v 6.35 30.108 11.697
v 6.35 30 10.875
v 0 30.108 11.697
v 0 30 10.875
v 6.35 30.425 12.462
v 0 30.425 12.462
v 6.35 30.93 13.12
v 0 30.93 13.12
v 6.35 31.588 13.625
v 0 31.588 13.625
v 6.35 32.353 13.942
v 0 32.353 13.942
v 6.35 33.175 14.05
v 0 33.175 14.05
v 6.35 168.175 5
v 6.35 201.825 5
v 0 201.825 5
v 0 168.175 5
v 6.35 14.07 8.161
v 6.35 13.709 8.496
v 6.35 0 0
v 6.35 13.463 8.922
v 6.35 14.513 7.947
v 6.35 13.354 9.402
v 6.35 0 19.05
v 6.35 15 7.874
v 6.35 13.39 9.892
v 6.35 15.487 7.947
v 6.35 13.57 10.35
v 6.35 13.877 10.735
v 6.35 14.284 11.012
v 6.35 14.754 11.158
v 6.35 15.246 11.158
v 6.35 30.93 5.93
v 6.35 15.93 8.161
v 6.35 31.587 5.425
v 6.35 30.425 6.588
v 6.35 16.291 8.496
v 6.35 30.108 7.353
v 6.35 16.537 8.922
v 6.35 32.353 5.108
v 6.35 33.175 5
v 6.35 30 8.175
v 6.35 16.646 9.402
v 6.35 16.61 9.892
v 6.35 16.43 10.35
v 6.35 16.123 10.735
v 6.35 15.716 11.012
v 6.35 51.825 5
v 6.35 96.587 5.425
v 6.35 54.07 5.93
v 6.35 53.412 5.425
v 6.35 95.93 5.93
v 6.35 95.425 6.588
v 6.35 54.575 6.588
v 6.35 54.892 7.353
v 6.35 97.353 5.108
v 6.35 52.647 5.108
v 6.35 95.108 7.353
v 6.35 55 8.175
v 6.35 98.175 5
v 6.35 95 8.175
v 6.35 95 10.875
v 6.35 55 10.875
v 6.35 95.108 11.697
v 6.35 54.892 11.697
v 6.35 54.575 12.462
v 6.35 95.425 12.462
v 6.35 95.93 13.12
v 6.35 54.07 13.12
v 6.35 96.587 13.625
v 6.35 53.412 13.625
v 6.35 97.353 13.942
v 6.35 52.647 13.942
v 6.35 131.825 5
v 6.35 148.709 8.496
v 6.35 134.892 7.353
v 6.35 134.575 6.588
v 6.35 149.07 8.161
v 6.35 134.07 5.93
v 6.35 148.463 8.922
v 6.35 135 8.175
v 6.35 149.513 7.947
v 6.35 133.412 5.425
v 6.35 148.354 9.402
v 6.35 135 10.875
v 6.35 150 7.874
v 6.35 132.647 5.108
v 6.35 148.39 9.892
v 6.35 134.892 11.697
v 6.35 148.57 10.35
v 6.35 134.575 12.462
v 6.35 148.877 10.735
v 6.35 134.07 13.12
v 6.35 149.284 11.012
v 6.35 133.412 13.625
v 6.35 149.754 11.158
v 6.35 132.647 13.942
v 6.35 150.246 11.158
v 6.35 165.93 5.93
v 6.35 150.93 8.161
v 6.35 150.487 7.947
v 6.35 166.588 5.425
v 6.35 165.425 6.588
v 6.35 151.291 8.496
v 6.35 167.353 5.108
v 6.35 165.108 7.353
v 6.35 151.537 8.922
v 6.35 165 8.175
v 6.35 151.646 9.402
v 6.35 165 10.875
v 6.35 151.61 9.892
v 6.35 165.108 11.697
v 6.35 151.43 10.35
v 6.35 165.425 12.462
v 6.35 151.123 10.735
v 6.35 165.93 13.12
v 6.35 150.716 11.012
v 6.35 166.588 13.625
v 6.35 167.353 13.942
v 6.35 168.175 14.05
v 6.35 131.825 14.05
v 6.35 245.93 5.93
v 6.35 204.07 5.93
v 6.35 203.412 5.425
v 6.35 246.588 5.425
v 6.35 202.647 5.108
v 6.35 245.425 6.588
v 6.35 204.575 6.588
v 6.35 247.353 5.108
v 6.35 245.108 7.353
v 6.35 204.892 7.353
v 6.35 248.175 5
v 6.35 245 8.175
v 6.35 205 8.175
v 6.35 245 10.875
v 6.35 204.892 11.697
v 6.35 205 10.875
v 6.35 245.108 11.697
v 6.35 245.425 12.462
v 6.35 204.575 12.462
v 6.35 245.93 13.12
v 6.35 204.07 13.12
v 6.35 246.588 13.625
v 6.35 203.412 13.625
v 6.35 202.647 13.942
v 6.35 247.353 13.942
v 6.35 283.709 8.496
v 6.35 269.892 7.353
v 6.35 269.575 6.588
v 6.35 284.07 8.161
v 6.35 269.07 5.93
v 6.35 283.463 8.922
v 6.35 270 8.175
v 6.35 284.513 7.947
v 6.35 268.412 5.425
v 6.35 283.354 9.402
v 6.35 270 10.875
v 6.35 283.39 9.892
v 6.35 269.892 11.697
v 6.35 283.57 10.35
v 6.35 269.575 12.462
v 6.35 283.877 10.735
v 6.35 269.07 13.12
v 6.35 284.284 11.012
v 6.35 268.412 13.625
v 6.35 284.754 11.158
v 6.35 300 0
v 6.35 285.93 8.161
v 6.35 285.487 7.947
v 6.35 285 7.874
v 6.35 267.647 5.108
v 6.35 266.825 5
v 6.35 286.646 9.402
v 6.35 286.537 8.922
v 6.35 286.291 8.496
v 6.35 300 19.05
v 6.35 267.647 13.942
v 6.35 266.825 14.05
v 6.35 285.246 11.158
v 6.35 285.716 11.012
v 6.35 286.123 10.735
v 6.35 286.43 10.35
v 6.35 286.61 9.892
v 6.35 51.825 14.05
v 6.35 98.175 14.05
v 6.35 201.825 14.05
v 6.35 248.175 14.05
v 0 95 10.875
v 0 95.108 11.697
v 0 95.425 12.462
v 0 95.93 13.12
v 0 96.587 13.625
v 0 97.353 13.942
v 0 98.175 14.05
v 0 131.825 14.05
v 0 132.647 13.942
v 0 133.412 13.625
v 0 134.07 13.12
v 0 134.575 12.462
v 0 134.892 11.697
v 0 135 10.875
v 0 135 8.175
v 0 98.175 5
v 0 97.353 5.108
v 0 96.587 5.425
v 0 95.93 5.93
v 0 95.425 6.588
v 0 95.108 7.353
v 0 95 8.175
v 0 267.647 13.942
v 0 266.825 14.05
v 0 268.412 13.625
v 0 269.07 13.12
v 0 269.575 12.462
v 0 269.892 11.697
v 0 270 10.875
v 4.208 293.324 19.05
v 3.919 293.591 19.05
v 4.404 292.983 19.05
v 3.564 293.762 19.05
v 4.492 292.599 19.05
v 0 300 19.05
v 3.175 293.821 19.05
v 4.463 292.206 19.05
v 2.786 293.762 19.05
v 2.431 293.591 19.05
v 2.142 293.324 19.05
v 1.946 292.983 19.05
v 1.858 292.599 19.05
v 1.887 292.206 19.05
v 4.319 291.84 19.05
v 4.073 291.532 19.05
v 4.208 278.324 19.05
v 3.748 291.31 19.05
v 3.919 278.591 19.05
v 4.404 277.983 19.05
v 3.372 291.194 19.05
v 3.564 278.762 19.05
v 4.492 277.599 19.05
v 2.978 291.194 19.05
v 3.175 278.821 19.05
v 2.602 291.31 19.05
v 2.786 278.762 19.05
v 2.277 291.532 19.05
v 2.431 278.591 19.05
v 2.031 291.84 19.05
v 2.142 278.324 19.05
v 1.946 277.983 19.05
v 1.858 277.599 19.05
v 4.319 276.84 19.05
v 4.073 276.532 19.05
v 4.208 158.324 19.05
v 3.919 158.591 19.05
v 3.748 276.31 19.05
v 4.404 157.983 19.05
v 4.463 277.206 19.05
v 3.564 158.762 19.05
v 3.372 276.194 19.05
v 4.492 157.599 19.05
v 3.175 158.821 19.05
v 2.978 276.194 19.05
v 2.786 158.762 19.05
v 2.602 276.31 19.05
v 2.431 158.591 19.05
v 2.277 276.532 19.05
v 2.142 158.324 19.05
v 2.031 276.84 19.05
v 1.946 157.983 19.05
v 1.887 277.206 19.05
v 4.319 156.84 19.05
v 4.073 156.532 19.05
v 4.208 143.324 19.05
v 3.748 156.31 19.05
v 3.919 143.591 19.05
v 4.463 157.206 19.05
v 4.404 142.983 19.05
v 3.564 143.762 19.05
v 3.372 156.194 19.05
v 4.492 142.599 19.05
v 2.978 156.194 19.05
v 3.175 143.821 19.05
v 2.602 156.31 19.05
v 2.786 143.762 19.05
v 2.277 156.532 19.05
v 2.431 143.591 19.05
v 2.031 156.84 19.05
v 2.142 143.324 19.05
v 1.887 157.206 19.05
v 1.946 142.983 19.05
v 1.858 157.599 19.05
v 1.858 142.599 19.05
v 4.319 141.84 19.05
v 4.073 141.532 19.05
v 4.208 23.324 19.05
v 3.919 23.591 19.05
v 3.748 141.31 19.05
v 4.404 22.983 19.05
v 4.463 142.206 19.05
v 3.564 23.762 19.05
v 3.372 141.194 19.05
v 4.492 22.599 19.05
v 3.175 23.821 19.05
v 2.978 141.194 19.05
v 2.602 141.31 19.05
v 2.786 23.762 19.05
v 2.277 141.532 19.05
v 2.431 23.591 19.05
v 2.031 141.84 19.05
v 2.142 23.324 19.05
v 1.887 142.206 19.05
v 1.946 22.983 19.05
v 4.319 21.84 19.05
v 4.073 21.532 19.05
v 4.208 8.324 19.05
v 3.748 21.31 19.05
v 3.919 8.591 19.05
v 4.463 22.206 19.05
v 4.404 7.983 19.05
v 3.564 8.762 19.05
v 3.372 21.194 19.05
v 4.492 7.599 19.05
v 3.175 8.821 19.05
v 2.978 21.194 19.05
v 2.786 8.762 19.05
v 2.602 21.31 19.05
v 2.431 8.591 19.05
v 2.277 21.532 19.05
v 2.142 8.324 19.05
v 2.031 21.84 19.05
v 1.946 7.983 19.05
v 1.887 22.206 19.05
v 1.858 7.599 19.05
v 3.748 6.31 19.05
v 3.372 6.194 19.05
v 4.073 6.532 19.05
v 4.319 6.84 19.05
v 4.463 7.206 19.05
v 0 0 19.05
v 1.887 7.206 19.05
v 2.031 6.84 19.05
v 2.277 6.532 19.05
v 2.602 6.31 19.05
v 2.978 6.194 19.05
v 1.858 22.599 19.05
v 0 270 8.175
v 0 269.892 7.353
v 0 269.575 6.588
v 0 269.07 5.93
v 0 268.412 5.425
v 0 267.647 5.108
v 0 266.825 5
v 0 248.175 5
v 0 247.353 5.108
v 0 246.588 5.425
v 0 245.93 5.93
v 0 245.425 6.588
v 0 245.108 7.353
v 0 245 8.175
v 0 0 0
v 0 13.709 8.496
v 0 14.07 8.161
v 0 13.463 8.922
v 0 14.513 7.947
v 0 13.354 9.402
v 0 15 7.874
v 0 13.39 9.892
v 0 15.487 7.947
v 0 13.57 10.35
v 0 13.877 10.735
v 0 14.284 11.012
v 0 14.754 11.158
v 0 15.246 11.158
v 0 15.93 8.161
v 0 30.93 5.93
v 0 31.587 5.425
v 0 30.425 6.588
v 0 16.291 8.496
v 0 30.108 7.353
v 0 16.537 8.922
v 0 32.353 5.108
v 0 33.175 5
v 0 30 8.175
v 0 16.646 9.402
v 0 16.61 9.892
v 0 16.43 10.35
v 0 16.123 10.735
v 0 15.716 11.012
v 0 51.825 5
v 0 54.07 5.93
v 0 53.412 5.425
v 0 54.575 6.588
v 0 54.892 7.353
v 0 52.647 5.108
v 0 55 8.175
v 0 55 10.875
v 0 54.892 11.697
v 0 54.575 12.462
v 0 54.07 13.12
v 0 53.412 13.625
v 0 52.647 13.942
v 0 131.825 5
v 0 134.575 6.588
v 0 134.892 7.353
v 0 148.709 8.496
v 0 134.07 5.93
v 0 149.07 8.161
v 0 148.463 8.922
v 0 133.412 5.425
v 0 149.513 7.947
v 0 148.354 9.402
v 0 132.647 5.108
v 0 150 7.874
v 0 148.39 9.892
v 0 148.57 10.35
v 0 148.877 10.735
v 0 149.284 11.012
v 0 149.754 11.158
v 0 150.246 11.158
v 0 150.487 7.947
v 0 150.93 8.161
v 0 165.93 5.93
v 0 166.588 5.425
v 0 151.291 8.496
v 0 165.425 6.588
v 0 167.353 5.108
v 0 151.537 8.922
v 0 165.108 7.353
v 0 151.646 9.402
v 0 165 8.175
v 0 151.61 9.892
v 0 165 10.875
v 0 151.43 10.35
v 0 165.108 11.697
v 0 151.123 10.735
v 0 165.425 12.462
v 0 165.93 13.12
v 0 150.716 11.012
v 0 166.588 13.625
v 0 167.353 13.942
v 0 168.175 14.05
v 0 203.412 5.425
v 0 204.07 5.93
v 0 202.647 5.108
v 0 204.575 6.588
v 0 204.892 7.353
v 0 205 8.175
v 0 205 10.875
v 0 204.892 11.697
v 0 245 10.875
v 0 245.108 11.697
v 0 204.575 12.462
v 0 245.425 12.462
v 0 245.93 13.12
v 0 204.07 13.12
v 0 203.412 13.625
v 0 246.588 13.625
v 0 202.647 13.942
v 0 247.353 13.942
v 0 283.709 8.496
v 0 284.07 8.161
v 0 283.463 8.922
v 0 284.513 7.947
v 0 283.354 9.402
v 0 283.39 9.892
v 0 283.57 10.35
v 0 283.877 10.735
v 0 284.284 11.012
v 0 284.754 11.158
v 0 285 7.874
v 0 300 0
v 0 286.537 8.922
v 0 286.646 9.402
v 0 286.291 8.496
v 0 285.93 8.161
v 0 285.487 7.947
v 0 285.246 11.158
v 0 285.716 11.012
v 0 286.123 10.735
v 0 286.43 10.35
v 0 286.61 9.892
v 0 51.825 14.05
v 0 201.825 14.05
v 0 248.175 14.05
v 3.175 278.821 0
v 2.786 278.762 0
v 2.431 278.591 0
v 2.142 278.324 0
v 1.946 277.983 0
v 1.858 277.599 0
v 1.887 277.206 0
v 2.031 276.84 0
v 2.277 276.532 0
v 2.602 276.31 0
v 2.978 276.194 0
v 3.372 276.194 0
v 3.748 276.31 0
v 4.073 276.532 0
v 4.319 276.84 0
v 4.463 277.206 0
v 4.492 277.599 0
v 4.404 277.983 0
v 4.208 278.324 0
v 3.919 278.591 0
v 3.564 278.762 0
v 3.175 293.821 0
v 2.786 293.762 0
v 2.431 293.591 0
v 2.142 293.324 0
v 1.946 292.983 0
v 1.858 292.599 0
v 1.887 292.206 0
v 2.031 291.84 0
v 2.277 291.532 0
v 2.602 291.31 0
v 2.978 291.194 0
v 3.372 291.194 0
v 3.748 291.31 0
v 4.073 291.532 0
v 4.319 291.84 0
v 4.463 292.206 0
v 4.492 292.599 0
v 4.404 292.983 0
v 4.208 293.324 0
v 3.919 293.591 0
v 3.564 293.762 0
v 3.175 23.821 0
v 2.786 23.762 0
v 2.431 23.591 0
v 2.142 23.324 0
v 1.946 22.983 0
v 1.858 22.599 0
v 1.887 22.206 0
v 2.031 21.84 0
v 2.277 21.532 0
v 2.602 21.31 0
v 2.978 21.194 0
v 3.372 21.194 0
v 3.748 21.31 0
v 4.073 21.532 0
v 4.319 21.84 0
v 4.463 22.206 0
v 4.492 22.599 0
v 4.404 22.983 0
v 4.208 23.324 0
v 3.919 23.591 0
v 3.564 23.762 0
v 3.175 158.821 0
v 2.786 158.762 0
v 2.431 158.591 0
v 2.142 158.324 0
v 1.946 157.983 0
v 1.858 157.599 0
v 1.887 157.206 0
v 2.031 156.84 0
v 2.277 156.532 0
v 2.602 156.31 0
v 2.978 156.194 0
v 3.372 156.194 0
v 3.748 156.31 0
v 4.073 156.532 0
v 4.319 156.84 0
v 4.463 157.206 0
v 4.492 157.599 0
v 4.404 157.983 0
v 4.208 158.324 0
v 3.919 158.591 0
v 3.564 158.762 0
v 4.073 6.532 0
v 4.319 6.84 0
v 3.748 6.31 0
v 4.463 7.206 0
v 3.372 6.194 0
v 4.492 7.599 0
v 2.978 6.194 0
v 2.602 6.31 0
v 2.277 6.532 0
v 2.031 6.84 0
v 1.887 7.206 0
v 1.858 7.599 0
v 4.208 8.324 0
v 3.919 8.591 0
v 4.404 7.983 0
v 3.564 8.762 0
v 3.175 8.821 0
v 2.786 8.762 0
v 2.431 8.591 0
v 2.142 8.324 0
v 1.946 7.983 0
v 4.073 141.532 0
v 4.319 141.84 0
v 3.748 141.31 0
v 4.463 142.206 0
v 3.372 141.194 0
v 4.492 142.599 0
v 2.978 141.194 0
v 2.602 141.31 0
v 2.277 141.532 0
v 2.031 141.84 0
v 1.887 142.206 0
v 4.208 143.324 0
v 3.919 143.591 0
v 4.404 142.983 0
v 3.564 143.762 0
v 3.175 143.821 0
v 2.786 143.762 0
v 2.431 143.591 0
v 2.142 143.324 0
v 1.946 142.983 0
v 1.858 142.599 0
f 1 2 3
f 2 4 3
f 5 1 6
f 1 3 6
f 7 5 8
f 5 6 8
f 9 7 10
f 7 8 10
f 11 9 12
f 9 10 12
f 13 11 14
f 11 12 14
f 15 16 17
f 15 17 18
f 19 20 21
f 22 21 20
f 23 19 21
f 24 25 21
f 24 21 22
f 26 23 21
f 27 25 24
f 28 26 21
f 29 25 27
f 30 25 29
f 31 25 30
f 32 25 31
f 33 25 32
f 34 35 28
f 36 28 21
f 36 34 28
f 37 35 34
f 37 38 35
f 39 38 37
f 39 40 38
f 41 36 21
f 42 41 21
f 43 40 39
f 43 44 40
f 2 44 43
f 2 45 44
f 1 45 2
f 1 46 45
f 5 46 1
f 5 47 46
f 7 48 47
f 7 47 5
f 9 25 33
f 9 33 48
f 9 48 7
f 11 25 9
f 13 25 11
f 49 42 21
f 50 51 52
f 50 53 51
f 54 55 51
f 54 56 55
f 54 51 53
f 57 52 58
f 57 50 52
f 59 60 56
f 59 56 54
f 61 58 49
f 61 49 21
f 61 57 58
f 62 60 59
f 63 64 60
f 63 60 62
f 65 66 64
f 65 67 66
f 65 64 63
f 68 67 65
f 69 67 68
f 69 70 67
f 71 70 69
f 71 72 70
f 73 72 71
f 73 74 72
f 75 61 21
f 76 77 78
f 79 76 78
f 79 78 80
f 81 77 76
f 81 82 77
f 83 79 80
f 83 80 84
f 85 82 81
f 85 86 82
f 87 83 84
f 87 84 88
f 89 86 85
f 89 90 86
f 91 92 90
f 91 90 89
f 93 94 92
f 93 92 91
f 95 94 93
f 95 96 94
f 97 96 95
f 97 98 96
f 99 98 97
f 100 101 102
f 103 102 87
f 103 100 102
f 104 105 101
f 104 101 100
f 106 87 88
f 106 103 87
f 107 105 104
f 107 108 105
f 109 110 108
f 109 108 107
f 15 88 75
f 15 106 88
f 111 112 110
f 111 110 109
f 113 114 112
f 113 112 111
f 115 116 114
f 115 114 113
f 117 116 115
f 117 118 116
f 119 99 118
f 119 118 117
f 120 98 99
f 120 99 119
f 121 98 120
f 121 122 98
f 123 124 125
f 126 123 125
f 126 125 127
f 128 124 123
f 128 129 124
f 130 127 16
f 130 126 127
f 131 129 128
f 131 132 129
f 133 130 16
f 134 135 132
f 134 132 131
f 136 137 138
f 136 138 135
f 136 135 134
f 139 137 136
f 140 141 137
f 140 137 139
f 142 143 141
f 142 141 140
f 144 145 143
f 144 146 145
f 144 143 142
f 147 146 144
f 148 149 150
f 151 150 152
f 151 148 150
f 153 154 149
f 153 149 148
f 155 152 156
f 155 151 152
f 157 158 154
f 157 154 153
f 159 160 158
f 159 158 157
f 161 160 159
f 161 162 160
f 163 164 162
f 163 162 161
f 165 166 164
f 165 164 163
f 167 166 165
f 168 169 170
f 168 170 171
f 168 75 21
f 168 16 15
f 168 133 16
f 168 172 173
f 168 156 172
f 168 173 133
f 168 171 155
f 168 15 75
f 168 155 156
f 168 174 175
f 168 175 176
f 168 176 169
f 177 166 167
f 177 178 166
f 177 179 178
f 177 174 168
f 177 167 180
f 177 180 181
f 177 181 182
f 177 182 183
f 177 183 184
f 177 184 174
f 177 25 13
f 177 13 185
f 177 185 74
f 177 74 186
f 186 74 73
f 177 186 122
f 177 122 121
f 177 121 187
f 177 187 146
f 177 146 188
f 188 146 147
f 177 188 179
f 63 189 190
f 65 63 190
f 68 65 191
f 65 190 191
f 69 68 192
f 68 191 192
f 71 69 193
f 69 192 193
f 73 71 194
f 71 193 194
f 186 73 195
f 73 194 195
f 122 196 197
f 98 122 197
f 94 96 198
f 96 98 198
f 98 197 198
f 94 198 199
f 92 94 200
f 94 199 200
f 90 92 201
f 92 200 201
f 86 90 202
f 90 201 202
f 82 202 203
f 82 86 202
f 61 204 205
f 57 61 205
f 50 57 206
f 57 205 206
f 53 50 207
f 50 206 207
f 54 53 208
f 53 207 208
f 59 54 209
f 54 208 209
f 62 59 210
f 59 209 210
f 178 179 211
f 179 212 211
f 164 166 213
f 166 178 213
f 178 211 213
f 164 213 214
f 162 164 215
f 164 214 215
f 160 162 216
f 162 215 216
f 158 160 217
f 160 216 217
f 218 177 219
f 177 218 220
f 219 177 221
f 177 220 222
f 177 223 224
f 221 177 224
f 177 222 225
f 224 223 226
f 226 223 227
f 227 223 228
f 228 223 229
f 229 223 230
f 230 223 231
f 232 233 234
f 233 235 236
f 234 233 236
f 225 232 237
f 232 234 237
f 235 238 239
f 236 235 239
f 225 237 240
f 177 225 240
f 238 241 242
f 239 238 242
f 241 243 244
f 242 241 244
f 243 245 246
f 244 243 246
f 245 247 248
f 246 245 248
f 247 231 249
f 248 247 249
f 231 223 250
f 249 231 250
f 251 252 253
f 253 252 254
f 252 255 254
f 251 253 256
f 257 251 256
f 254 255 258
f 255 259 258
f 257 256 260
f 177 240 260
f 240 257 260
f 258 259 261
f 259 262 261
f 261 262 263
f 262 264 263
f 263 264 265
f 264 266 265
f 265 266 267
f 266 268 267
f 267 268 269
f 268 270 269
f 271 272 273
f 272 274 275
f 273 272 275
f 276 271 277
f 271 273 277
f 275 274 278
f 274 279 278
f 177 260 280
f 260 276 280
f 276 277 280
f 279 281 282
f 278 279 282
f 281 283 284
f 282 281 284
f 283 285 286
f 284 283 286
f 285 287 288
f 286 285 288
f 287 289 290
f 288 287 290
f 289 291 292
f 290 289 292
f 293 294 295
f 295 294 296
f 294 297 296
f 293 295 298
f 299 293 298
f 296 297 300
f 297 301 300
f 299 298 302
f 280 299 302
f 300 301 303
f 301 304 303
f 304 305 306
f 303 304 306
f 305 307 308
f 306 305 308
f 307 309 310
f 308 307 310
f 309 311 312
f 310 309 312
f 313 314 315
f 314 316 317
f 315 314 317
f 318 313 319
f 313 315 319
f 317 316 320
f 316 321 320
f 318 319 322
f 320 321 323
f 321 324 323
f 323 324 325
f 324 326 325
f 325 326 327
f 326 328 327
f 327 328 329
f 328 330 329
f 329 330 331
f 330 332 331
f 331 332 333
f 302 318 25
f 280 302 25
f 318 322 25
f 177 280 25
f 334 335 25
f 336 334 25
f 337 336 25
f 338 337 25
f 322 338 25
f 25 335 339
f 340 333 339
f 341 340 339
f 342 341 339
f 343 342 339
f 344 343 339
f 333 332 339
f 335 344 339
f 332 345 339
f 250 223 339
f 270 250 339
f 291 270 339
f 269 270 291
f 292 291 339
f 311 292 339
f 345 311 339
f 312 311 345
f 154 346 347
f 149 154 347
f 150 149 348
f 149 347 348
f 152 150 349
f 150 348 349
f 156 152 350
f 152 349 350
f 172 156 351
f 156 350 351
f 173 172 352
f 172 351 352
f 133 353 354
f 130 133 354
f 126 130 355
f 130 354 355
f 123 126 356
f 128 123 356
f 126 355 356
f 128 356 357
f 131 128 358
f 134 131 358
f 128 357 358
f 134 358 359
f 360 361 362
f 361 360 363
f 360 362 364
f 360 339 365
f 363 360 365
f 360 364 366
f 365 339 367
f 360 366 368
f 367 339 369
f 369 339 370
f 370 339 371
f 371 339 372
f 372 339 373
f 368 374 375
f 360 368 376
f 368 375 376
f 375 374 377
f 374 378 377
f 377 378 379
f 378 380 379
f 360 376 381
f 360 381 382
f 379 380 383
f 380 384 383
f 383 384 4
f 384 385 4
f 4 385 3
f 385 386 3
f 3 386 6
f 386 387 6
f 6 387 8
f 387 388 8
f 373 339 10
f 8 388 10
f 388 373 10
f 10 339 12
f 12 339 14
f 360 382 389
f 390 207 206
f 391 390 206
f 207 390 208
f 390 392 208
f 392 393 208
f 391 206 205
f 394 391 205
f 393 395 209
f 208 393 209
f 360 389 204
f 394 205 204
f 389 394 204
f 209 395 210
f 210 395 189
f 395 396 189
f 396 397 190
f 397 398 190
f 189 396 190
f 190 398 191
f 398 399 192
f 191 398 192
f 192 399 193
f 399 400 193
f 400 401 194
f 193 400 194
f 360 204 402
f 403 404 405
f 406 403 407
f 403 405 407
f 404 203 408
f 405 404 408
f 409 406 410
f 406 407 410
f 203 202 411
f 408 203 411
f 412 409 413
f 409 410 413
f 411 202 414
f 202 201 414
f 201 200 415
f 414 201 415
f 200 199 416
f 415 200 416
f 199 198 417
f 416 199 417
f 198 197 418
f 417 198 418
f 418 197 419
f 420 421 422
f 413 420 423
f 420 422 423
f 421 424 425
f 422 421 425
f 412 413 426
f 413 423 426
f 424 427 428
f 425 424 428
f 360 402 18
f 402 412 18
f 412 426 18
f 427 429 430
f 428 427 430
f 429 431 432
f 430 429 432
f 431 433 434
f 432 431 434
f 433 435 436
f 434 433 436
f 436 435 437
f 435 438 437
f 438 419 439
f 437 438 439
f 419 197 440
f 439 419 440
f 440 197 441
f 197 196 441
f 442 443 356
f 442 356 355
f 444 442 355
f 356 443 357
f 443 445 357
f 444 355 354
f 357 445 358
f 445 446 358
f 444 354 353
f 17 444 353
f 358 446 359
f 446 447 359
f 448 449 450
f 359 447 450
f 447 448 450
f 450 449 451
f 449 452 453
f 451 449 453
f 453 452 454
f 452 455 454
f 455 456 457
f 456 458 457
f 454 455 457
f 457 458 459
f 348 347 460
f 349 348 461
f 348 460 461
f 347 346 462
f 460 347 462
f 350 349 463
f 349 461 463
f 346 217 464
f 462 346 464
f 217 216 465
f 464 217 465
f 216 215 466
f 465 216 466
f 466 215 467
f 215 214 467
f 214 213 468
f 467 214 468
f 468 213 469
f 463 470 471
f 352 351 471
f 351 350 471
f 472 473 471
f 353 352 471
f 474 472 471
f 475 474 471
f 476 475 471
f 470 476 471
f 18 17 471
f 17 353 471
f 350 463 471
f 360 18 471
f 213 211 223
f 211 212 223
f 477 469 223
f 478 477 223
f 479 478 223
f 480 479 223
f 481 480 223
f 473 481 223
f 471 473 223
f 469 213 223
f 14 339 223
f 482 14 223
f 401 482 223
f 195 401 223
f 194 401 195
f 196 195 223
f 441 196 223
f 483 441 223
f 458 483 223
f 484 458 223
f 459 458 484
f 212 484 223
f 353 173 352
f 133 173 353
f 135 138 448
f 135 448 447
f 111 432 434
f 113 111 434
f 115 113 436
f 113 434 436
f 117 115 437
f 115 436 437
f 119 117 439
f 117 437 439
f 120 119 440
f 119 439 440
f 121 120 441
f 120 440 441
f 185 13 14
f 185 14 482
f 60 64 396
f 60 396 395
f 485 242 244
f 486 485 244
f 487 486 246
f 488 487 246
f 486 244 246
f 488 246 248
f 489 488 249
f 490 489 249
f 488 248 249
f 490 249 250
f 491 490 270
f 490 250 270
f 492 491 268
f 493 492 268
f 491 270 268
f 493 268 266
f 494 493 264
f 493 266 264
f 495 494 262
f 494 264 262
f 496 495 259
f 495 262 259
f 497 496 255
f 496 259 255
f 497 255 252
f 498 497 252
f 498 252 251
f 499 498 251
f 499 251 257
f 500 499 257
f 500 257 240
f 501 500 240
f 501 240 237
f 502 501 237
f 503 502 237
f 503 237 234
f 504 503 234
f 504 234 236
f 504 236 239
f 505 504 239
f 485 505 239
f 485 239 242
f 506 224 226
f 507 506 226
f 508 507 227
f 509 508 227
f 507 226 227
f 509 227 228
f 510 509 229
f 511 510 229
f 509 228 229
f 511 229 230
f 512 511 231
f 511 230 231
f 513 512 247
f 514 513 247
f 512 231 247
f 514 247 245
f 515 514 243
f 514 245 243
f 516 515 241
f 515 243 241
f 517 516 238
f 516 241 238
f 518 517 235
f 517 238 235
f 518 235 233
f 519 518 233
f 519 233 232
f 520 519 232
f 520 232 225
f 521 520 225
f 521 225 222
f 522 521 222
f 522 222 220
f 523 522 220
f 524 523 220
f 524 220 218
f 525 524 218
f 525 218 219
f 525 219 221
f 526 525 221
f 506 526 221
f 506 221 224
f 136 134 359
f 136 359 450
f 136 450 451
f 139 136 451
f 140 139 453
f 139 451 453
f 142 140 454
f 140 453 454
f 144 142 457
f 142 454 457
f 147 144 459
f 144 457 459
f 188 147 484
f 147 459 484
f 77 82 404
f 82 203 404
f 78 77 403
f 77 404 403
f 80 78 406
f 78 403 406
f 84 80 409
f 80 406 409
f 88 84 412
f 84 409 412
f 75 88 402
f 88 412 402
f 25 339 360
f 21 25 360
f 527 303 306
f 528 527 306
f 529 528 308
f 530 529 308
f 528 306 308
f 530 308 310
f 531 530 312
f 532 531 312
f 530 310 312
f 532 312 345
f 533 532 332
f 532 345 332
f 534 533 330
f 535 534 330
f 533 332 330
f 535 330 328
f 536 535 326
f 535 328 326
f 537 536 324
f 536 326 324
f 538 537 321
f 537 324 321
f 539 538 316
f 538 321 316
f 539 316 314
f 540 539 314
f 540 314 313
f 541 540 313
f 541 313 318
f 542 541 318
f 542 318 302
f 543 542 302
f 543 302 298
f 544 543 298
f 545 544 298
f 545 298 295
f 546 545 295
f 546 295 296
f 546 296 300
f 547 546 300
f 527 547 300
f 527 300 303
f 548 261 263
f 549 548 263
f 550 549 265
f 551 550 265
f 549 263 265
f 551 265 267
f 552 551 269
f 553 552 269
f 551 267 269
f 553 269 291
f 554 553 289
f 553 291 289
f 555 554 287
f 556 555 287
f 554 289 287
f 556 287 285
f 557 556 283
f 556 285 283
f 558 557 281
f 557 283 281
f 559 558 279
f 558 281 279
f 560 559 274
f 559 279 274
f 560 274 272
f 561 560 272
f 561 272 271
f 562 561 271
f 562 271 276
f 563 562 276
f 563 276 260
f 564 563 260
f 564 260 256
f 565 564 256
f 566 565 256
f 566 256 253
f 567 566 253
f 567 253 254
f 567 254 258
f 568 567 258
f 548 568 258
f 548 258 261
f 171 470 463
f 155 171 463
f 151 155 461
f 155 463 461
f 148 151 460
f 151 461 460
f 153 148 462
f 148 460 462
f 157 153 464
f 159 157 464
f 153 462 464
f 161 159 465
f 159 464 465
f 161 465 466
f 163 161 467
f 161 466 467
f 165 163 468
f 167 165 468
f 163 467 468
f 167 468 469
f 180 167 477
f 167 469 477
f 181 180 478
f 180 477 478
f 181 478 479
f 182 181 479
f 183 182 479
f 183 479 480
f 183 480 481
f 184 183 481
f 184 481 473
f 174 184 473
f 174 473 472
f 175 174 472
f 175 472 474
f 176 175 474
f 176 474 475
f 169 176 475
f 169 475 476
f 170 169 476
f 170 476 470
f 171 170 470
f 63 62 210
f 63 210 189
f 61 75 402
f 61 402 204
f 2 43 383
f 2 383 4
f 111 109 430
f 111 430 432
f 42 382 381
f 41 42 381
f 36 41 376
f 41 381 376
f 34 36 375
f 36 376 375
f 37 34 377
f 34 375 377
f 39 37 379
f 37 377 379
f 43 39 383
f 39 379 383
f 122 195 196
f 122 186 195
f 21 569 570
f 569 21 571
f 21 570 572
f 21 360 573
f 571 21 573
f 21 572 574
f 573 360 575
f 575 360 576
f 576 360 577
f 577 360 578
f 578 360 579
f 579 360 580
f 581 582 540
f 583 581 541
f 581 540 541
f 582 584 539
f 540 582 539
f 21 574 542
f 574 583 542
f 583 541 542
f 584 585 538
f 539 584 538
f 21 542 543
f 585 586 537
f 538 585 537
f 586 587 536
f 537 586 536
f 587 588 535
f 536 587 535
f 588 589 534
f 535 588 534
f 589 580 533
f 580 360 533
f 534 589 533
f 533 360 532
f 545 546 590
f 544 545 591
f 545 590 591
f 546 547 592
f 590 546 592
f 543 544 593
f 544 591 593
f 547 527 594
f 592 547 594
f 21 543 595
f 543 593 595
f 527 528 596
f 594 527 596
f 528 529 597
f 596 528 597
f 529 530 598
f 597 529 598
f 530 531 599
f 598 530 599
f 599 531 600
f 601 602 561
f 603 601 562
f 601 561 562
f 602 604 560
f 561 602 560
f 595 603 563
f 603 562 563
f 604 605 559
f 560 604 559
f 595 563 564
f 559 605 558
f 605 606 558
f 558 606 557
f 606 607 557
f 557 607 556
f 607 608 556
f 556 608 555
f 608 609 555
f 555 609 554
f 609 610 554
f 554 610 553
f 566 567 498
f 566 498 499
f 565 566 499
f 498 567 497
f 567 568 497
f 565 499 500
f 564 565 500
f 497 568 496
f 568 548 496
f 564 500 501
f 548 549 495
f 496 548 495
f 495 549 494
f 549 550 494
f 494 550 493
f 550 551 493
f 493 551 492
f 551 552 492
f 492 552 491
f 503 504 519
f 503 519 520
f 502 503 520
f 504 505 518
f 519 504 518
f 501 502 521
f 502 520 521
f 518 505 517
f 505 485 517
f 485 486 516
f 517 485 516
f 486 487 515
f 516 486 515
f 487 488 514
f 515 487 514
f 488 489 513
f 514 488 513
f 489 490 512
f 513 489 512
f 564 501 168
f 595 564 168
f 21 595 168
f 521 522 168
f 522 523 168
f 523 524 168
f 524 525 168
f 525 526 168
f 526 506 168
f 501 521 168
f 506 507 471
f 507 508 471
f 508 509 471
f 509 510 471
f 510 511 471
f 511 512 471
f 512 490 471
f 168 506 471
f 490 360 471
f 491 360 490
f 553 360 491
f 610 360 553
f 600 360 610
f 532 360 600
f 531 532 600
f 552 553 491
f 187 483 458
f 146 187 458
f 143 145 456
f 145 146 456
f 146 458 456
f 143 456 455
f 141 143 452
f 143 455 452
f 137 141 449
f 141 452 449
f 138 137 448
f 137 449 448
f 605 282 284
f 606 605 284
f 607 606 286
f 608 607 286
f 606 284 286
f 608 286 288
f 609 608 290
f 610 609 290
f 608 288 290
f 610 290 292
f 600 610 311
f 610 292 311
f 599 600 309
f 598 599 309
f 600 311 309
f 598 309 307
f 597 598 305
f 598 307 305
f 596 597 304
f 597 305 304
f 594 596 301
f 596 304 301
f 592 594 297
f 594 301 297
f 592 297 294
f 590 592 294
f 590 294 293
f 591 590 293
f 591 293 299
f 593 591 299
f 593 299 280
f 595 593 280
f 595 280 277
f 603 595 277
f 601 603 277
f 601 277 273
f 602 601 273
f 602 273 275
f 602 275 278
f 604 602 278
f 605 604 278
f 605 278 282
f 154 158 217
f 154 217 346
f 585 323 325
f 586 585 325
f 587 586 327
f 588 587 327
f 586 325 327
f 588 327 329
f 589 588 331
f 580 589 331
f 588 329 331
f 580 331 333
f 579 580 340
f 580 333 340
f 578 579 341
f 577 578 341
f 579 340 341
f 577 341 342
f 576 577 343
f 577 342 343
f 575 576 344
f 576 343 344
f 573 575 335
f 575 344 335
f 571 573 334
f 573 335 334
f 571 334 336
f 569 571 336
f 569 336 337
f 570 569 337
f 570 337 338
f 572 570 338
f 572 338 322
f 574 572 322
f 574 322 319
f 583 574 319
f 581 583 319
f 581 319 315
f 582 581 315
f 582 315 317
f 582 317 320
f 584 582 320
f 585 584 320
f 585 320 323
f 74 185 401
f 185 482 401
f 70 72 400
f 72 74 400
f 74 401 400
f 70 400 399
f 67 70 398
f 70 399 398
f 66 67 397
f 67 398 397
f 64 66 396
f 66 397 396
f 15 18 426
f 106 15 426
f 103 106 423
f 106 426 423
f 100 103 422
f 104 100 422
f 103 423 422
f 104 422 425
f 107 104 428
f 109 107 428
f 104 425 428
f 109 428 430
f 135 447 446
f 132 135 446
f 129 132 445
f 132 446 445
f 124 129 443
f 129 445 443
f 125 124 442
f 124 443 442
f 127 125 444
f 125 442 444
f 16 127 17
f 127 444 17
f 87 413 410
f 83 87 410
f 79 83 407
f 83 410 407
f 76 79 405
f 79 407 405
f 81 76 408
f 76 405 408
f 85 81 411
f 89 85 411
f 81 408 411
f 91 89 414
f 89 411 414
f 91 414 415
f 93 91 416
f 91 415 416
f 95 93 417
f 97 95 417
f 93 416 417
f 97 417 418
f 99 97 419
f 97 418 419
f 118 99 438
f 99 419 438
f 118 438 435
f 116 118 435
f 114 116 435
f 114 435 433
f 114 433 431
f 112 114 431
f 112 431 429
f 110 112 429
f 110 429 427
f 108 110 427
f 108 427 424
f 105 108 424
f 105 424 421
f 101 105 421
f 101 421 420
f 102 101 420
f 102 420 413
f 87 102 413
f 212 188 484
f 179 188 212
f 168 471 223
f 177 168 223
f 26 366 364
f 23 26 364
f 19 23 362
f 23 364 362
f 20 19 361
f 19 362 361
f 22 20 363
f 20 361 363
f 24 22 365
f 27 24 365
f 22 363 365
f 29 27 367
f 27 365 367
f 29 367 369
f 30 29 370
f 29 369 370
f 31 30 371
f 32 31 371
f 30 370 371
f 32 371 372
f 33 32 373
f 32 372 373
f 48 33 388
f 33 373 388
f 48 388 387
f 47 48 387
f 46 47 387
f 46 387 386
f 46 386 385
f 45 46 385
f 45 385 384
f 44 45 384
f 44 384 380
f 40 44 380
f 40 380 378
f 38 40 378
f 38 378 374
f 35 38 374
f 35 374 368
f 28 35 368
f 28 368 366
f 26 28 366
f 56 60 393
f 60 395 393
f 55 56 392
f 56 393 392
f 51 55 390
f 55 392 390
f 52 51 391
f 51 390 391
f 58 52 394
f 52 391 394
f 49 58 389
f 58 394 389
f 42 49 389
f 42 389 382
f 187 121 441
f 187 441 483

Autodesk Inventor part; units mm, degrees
ref_plane "YZ Plane" through (0, 0, 0) normal (1, 0, 0) x (0, 1, 0)
ref_plane "XZ Plane" through (0, 0, 0) normal (0, 1, 0) x (-1, 0, 0)
ref_plane "XY Plane" through (0, 0, 0) normal (0, 0, 1) x (1, 0, 0)
sketch "Sketch1" plane through (0, 0, 0) normal (1, 0, 0) x (0, 1, 0)
  line L0 (0, 0) -> (300, 0)
  line L1 (300, 0) -> (300, 19.05)
  line L2 (300, 19.05) -> (0, 19.05)
  line L3 (0, 19.05) -> (0, 0)
  dimension "d0" = 300
  dimension "d1" = 19.05
extrude "Extrusion1" add sketch "Sketch1" along normal blind 6.35
sketch "Sketch2" plane through (6.35, 0, 0) normal (1, 0, 0) x (0, 0, -1)
  line L0 (0, 300) -> (-19.05, 300) projected
  line L1 (-19.05, 300) -> (-19.05, 0) projected
  line L2 (-19.05, 0) -> (0, 0) projected
  point P0 (-9.525, 285)
  point P1 (-9.525, 150)
  point P2 (-9.525, 15)
  dimension "d4" = 15
  dimension "d5" = 19.05
  dimension "d6" = 9.525
  dimension "d7" = 15
  dimension "d8" = 9.525
  dimension "d9" = 9.525
  dimension "d10" = 150
hole "Hole1" at (6.35, 285, 9.525) at (6.35, 150, 9.525) at (6.35, 15, 9.525) direction (-1, 0, 0) diameter 3.302 end through all thread size "8-32 UNC" class "2B" standard "ANSI Unified Screw Threads"
sketch "Sketch5" plane through (6.35, 0, 0) normal (1, 0, 0) x (0, 0, -1)
  line L0 (-14.05, 270) -> (-5, 270)
  line L1 (-5, 270) -> (-5, 245)
  line L2 (-5, 245) -> (-14.05, 245)
  line L3 (-14.05, 245) -> (-14.05, 270)
  line L4 (-14.05, 205) -> (-5, 205)
  line L5 (-5, 205) -> (-5, 165)
  line L6 (-5, 165) -> (-14.05, 165)
  line L7 (-14.05, 165) -> (-14.05, 205)
  line L8 (-14.05, 135) -> (-5, 135)
  line L9 (-5, 135) -> (-5, 95)
  line L10 (-5, 95) -> (-14.05, 95)
  line L11 (-14.05, 95) -> (-14.05, 135)
  line L12 (-14.05, 55) -> (-5, 55)
  line L13 (-5, 55) -> (-5, 30)
  line L14 (-5, 30) -> (-14.05, 30)
  line L15 (-14.05, 30) -> (-14.05, 55)
  line L16 (0, 0) -> (0, 300) projected
  line L17 (-19.05, 300) -> (-19.05, 0) projected
  line L18 (0, 300) -> (-19.05, 300) projected
  line L19 (-19.05, 0) -> (0, 0) projected
  dimension "d44" = 5
  dimension "d45" = 5
  dimension "d46" = 30
  dimension "d47" = 30
  dimension "d48" = 55
  dimension "d49" = 95
  dimension "d50" = 135
  dimension "d51" = 55
  dimension "d52" = 95
  dimension "d53" = 135
extrude "Extrusion2" cut sketch "Sketch5" against normal through all contours L0 L1 L2 L3 | L4 L5 L6 L7 | L8 L9 L10 L11 | L12 L13 L14 L15
fillet "Fillet1" radius 3.175 1 edges at (3.175, 270, 5)
fillet "Fillet2" radius 3.175 1 edges at (3.175, 270, 14.05)
fillet "Fillet3" radius 3.175 1 edges at (3.175, 245, 5)
fillet "Fillet4" radius 3.175 1 edges at (3.175, 245, 14.05)
fillet "Fillet5" radius 3.175 1 edges at (3.175, 205, 5)
fillet "Fillet6" radius 3.175 1 edges at (3.175, 205, 14.05)
fillet "Fillet7" radius 3.175 1 edges at (3.175, 165, 5)
fillet "Fillet8" radius 3.175 1 edges at (3.175, 165, 14.05)
fillet "Fillet9" radius 3.175 1 edges at (3.175, 95, 5)
fillet "Fillet10" radius 3.175 1 edges at (3.175, 135, 5)
fillet "Fillet11" radius 3.175 1 edges at (3.175, 135, 14.05)
fillet "Fillet12" radius 3.175 1 edges at (3.175, 95, 14.05)
fillet "Fillet13" radius 3.175 1 edges at (3.175, 55, 5)
fillet "Fillet14" radius 3.175 1 edges at (3.175, 55, 14.05)
fillet "Fillet15" radius 3.175 1 edges at (3.175, 30, 14.05)
fillet "Fillet16" radius 3.175 1 edges at (3.175, 30, 5)
sketch "Sketch7" plane through (0, 0, 0) normal (0, 0, -1) x (-1, 0, 0)
  line L0 (0, 300) -> (-6.35, 300) projected
  line L1 (0, 0) -> (-6.35, 0) projected
  line L2 (-6.35, 0) -> (-6.35, 300) projected
  point P0 (-3.175, 7.5)
  point P1 (-3.175, 22.5)
  point P2 (-3.175, 142.5)
  point P3 (-3.175, 157.5)
  point P4 (-3.175, 277.5)
  point P5 (-3.175, 292.5)
  dimension "d72" = 7.5
  dimension "d73" = 22.5
  dimension "d74" = 142.5
  dimension "d78" = 7.5
  dimension "d79" = 22.5
  dimension "d82" = 142.5
  dimension "d83" = 6.35
  dimension "d84" = 3.175
  dimension "d85" = 3.175
  dimension "d88" = 3.175
  dimension "d89" = 3.175
  dimension "d92" = 3.175
  dimension "d93" = 3.175
hole "Hole3" at (3.175, 7.5, 0) at (3.175, 22.5, 0) at (3.175, 142.5, 0) at (3.175, 157.5, 0) at (3.175, 277.5, 0) at (3.175, 292.5, 0) direction (0, 0, 1) diameter 2.6416 end through all thread size "6-32 UNC" class "2B" standard "ANSI Unified Screw Threads"
equation "\"d6\" = 0.5 * d5"
equation "\"d7\" = d4"
equation "\"d8\" = d6"
equation "\"d9\" = d6"
equation "\"d45\" = d44"
equation "\"d47\" = d46"
equation "\"d51\" = d48"
equation "\"d52\" = d49"
equation "\"d53\" = d50"
equation "\"d78\" = d72"
equation "\"d79\" = d73"
equation "\"d82\" = d74"
equation "\"d84\" = 0.5 * d83"
equation "\"d85\" = d84"
equation "\"d88\" = d87"
equation "\"d89\" = d88"
equation "\"d92\" = d91"
equation "\"d93\" = d91"
equation "\"d87\" = d84"
equation "\"d91\" = d89"
properties part number "slides"
